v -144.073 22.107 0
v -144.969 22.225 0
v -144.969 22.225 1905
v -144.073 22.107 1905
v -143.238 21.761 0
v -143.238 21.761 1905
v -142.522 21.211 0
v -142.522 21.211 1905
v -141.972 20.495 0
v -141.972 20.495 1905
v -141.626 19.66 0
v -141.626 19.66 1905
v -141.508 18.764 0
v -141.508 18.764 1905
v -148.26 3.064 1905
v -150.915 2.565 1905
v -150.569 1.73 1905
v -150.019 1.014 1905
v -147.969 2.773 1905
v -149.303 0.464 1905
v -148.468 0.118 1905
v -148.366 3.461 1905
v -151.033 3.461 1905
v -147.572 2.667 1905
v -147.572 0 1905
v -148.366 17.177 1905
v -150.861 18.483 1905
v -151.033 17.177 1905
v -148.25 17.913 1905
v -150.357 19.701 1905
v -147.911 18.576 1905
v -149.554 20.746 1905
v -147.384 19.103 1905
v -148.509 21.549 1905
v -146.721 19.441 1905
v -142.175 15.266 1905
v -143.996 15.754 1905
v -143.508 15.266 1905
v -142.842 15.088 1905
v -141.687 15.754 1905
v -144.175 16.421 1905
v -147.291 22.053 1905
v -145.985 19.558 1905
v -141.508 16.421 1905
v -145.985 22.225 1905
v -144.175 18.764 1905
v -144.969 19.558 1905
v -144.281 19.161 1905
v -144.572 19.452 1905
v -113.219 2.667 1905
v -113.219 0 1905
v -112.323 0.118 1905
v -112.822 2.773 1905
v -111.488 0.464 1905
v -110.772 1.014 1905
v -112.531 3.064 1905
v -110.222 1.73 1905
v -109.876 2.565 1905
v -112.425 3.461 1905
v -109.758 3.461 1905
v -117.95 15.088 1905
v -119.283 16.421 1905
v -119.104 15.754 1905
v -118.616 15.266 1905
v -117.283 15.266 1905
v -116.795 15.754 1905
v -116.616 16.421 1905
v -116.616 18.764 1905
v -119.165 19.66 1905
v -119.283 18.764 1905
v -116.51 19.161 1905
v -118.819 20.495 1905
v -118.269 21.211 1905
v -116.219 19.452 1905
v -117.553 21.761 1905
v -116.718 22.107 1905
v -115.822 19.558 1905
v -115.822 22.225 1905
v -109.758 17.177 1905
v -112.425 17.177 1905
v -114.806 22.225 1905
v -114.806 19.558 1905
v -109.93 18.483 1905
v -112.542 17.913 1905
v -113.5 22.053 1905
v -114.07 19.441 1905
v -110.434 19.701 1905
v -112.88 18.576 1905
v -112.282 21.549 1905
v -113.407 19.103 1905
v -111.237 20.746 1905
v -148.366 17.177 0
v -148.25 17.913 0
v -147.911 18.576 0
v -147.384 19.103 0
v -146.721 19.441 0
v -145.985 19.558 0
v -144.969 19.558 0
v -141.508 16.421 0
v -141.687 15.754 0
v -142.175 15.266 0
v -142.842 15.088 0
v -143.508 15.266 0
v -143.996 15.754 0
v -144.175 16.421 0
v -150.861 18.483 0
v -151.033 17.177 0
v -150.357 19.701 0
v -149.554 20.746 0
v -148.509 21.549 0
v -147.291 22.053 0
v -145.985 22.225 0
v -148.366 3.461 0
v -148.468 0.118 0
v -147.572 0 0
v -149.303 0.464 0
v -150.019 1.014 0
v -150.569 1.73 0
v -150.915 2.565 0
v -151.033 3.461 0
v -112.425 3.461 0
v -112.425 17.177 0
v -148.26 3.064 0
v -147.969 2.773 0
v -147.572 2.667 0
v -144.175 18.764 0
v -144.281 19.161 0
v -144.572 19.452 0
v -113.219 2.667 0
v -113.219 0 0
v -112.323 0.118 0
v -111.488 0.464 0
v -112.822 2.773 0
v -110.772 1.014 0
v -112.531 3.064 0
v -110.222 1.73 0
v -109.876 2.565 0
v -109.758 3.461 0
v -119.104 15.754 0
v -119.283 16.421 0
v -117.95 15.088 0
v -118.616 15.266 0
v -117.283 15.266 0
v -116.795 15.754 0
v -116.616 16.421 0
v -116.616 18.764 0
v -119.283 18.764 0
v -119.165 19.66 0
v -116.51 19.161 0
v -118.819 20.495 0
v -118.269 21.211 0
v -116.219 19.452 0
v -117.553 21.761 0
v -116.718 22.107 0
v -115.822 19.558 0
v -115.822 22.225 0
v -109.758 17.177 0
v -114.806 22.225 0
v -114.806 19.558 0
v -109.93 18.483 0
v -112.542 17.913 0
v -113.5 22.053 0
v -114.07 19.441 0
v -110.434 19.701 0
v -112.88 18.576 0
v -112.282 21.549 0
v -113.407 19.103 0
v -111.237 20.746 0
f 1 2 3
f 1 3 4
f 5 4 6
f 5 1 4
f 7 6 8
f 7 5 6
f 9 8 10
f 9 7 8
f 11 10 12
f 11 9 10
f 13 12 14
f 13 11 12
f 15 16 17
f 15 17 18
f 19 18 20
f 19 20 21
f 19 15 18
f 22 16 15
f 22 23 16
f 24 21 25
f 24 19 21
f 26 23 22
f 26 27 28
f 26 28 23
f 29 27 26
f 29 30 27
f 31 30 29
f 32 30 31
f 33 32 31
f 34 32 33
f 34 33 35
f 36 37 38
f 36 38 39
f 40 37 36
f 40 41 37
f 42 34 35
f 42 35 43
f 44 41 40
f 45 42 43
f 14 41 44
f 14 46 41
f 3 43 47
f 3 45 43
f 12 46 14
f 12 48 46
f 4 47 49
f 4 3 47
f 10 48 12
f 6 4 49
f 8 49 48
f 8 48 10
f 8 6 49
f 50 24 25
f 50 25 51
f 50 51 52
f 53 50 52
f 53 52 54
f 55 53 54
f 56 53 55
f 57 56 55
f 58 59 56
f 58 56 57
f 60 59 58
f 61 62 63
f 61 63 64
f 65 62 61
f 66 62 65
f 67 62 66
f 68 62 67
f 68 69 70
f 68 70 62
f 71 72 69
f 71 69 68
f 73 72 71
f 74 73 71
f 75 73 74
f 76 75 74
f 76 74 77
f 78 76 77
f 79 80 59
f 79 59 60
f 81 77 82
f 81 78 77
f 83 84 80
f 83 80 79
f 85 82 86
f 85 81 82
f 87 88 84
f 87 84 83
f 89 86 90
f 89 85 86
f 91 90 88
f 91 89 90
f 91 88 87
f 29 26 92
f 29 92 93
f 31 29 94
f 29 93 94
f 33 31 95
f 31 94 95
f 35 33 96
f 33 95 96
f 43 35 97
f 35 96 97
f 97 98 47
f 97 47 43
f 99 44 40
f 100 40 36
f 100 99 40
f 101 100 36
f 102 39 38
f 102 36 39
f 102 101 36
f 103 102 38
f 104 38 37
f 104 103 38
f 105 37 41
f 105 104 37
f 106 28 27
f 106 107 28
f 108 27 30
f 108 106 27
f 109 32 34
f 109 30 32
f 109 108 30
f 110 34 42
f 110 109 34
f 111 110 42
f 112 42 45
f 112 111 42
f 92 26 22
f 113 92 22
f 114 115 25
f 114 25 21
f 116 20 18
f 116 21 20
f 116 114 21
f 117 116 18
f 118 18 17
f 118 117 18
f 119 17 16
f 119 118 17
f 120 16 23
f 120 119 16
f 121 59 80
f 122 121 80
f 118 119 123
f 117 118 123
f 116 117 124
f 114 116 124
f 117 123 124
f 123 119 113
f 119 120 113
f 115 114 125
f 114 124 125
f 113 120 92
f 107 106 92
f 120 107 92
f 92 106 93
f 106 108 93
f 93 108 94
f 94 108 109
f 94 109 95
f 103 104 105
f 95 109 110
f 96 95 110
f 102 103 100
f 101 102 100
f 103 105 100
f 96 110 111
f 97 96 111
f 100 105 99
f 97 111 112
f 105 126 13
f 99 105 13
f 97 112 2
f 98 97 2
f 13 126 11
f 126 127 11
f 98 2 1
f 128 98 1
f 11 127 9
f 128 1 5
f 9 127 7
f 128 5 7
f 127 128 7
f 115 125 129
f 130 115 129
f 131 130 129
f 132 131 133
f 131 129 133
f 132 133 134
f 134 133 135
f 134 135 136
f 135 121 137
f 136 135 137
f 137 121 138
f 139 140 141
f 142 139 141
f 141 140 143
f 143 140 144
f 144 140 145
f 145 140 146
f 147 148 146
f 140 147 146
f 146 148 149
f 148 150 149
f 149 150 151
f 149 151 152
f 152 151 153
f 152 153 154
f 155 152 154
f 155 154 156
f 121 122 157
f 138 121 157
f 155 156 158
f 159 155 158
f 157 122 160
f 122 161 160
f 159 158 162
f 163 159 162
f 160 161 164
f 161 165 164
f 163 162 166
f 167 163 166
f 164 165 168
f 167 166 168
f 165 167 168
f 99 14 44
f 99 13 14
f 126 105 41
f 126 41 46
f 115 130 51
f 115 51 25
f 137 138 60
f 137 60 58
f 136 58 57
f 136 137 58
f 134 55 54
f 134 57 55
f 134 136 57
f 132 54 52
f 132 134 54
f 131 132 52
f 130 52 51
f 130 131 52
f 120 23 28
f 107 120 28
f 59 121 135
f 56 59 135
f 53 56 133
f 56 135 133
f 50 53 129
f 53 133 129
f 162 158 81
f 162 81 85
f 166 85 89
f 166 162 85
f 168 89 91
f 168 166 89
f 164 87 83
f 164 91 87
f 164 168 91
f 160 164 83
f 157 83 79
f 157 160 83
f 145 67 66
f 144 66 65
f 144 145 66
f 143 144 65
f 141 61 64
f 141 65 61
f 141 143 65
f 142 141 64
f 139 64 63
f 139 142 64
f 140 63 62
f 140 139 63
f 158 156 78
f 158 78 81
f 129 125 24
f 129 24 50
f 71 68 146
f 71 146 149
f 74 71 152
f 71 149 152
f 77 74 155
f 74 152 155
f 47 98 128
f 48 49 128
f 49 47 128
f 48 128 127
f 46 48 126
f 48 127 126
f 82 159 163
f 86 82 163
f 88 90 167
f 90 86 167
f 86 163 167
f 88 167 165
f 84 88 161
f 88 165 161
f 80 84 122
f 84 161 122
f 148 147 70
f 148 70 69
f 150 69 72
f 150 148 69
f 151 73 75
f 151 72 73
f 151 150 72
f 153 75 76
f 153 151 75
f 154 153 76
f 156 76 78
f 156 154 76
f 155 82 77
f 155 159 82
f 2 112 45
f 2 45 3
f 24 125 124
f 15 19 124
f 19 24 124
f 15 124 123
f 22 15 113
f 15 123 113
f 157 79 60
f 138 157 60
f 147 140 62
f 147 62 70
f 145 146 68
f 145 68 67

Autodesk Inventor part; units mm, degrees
ref_plane "YZ Plane" through (0, 0, 0) normal (1, 0, 0) x (0, 1, 0)
ref_plane "XZ Plane" through (0, 0, 0) normal (0, 1, 0) x (-1, 0, 0)
ref_plane "Work Plane1" through (0, 0, 0) normal (0, 0, 1) x (1, 0, 0)
sketch "Sketch1" plane through (0, 0, 0) normal (0, 0, 1) x (1, 0, 0)
  arc A0 (-113.2188, 0) -> (-109.7581, 3.4607) centre (-113.2188, 3.4607) ccw projected
  line L0 (-109.7581, 17.1767) -> (-109.7581, 3.4607) projected
  arc A1 (-109.7581, 17.1767) -> (-114.8063, 22.225) centre (-114.8063, 17.1767) ccw projected
  line L1 (-115.8223, 22.225) -> (-114.8063, 22.225) projected
  arc A2 (-115.8223, 22.225) -> (-119.2831, 18.7642) centre (-115.8223, 18.7642) ccw projected
  line L2 (-119.2831, 16.4211) -> (-119.2831, 18.7642) projected
  arc A3 (-119.2831, 16.4211) -> (-116.6161, 16.4211) centre (-117.9496, 16.4211) ccw projected
  line L3 (-116.6161, 18.7642) -> (-116.6161, 16.4211) projected
  arc A4 (-115.8223, 19.558) -> (-116.6161, 18.7642) centre (-115.8223, 18.7642) ccw projected
  line L4 (-114.8063, 19.558) -> (-115.8223, 19.558) projected
  arc A5 (-112.4251, 17.1767) -> (-114.8063, 19.558) centre (-114.8063, 17.1767) ccw projected
  line L5 (-112.4251, 3.4607) -> (-112.4251, 17.1767) projected
  arc A6 (-113.2188, 2.667) -> (-112.4251, 3.4607) centre (-113.2188, 3.4607) ccw projected
  line L6 (-147.5723, 2.667) -> (-113.2188, 2.667) projected
  arc A7 (-148.3661, 3.4607) -> (-147.5723, 2.667) centre (-147.5723, 3.4607) ccw projected
  line L7 (-148.3661, 17.1767) -> (-148.3661, 3.4607) projected
  arc A8 (-145.9848, 19.558) -> (-148.3661, 17.1767) centre (-145.9848, 17.1767) ccw projected
  line L8 (-144.9688, 19.558) -> (-145.9848, 19.558) projected
  arc A9 (-144.1751, 18.7642) -> (-144.9688, 19.558) centre (-144.9688, 18.7642) ccw projected
  line L9 (-144.1751, 16.4211) -> (-144.1751, 18.7642) projected
  arc A10 (-144.1751, 16.4211) -> (-141.5081, 16.4211) centre (-142.8416, 16.4211) ccw projected
  line L10 (-141.5081, 18.7642) -> (-141.5081, 16.4211) projected
  arc A11 (-141.5081, 18.7642) -> (-144.9688, 22.225) centre (-144.9688, 18.7642) ccw projected
  line L11 (-145.9848, 22.225) -> (-144.9688, 22.225) projected
  arc A12 (-145.9848, 22.225) -> (-151.0331, 17.1767) centre (-145.9848, 17.1767) ccw projected
  line L12 (-151.0331, 3.4607) -> (-151.0331, 17.1767) projected
  arc A13 (-151.0331, 3.4607) -> (-147.5723, 0) centre (-147.5723, 3.4607) ccw projected
  line L13 (-113.2188, 0) -> (-147.5723, 0) projected
  point P0 (0, 0)
extrude "Extrusion1" add sketch "Sketch1" along normal blind 1905
properties part number "Unistrut 75"
